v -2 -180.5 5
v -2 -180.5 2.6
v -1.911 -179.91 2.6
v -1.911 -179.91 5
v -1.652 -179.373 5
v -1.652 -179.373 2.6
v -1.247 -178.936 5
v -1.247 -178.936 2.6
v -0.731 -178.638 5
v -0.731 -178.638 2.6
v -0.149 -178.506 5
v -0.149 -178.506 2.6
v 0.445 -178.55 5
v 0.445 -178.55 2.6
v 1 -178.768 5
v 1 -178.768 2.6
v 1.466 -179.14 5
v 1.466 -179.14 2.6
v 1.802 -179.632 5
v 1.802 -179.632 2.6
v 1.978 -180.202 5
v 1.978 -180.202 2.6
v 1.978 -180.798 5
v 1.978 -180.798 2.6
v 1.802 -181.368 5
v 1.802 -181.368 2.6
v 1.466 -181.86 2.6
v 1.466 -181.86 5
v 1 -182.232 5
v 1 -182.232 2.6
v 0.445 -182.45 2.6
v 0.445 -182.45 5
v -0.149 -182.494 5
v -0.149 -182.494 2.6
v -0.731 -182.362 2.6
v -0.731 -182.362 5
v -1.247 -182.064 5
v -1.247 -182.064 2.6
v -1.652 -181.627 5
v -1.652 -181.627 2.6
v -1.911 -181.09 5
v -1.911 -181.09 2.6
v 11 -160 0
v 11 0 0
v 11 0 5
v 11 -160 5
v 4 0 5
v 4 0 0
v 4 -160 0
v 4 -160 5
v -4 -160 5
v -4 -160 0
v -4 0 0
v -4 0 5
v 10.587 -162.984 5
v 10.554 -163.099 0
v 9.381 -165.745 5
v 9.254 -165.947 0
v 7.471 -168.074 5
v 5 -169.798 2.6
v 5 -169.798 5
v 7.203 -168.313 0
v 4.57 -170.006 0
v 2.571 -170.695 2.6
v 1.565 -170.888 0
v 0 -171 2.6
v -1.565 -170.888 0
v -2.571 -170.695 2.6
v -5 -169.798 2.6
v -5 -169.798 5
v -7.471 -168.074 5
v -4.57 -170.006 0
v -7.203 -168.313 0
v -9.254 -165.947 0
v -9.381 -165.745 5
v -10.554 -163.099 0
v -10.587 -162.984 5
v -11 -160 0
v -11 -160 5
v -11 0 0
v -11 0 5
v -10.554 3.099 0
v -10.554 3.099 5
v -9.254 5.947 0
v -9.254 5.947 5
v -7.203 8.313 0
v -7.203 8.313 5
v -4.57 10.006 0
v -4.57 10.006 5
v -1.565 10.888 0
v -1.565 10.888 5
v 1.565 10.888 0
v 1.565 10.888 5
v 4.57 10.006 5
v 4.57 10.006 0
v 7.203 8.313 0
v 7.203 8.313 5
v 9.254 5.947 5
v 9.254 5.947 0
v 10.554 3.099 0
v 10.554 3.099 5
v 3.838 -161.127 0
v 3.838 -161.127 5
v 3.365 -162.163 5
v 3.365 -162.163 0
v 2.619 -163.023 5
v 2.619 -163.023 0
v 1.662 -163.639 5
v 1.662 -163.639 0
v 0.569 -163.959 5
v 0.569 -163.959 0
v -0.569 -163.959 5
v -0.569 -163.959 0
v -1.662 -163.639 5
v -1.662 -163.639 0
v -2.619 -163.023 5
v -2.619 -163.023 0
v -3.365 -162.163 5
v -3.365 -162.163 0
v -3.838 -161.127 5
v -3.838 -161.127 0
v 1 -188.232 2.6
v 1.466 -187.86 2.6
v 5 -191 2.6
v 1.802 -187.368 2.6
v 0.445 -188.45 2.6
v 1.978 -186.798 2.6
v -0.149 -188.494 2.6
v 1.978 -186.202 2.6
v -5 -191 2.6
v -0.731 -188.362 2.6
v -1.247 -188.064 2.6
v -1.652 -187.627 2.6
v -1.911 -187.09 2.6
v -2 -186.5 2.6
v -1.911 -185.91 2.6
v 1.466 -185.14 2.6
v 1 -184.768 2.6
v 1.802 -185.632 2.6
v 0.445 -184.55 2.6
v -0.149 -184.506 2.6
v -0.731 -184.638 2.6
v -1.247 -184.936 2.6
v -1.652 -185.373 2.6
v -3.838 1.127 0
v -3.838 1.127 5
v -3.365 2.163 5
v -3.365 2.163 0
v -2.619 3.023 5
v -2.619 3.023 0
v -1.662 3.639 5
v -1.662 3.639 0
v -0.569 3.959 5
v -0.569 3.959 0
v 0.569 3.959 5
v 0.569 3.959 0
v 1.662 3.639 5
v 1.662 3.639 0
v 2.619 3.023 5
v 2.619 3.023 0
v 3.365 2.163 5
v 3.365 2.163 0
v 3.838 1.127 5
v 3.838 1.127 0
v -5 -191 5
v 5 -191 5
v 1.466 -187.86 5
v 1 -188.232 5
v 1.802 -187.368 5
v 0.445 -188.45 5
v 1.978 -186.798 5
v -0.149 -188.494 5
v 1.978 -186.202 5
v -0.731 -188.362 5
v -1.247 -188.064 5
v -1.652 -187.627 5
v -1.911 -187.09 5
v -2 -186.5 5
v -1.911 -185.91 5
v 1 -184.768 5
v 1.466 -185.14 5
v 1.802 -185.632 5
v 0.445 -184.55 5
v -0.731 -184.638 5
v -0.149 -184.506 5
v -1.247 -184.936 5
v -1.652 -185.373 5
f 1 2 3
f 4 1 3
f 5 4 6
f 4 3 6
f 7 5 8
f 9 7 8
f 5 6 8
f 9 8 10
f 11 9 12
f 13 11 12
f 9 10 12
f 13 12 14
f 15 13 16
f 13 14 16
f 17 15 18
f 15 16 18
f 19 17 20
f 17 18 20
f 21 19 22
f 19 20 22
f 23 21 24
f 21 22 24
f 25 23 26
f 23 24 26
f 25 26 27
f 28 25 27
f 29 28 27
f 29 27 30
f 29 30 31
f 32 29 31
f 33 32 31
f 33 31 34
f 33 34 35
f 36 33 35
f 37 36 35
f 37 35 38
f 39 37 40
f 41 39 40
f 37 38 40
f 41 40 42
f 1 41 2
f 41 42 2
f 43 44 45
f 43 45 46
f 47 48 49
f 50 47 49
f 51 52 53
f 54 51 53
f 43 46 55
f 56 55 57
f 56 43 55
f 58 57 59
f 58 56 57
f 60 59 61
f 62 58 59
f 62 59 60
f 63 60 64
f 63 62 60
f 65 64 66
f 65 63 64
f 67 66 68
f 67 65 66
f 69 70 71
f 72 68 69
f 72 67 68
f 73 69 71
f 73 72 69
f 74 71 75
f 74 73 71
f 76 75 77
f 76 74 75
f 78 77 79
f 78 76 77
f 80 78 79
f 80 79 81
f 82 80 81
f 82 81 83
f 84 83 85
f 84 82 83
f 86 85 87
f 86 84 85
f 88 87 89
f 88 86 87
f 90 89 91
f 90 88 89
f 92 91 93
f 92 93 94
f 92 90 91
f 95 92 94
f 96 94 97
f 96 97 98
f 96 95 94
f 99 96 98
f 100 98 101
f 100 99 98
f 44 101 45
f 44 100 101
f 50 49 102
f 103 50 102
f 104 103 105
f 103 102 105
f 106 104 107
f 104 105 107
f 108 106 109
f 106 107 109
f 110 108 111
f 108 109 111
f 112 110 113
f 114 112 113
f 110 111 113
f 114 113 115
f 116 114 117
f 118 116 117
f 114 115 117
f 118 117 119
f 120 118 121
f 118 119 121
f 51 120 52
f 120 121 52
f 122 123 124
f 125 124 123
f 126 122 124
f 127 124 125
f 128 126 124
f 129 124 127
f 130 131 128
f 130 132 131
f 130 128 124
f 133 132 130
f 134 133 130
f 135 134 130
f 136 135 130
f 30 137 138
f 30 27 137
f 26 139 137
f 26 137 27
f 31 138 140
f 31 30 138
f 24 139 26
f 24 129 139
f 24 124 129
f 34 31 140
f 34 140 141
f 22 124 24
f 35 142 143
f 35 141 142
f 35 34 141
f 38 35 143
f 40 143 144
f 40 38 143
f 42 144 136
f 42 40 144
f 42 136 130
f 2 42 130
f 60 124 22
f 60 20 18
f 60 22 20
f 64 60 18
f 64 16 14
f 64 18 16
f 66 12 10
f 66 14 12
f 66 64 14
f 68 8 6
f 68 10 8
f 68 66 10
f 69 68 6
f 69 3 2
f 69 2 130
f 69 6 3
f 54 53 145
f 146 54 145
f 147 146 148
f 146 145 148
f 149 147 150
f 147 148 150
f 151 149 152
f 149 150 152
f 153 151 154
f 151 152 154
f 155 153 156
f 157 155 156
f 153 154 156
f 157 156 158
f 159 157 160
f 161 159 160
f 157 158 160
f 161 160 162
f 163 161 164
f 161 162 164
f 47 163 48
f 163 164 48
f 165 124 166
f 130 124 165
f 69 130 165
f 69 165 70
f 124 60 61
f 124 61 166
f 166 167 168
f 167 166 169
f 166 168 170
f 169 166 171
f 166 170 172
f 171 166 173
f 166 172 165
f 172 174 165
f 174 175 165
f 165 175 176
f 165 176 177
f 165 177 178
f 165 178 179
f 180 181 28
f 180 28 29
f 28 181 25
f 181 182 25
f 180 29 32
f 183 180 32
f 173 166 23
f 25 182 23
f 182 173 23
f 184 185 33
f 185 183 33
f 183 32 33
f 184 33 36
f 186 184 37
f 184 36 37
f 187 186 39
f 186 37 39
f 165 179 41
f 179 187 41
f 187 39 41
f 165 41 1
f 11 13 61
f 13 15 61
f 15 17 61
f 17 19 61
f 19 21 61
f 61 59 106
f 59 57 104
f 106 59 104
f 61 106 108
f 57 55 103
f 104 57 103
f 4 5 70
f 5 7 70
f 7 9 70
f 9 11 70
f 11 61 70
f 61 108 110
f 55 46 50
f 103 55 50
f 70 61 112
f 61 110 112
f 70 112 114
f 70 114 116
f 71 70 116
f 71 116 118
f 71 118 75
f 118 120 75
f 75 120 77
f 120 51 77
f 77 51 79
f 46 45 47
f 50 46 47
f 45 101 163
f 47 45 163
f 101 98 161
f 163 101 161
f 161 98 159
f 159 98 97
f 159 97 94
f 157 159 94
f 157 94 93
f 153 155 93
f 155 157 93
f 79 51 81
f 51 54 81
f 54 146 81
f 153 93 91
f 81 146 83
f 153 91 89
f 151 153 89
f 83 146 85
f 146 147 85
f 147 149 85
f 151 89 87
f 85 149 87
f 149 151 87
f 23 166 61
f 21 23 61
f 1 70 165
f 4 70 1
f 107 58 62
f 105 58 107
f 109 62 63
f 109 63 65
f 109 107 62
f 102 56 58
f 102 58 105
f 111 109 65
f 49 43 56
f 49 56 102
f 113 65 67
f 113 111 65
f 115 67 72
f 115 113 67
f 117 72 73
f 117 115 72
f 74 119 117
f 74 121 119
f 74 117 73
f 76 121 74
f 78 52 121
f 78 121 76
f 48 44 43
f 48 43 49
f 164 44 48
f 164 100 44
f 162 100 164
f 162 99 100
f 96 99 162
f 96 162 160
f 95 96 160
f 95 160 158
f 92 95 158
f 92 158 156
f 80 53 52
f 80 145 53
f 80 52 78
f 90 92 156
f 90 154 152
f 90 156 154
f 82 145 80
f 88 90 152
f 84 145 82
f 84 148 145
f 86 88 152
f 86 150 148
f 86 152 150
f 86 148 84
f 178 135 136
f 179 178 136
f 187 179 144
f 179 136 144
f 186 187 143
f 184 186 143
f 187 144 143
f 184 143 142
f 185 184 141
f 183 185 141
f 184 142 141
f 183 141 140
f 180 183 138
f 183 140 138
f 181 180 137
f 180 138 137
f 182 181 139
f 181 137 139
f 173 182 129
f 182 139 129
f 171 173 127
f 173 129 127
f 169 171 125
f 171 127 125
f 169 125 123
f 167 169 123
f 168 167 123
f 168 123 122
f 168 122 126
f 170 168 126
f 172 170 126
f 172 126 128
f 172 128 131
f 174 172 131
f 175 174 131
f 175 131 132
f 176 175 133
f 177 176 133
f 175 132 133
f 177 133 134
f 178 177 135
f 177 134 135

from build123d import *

# Parameters (mm, degrees)
BOSS_EXTRUDE1_DEPTH = 5
BOSS_EXTRUDE2_START = -2.4
BOSS_EXTRUDE2_DEPTH = 2.4
SKETCH3_R           = 2
CUT_EXTRUDE1_DEPTH  = 2.4


with BuildPart() as part:
    # Sketch1 → Boss-Extrude1 (new body)
    with BuildSketch(Plane.XY):
        with BuildLine():
            Line((11, 0), (11, -160))
            ThreePointArc((11, -160), (0, -171), (-11, -160))
            Line((-11, -160), (-11, 0))
            ThreePointArc((-11, 0), (0, 11), (11, 0))
        make_face()
        with BuildLine():
            Line((-4, -160), (-4, 0))
            ThreePointArc((-4, 0), (0, 4), (4, 0))
            Line((4, 0), (4, -160))
            ThreePointArc((4, -160), (0, -164), (-4, -160))
        make_face(mode=Mode.SUBTRACT)
    extrude(amount=BOSS_EXTRUDE1_DEPTH)

    # Sketch2 → Boss-Extrude2 (add)
    with BuildSketch(Plane.XY.offset(5).offset(BOSS_EXTRUDE2_START)):
        with BuildLine():
            Line((-5, -171), (-5, -169.797958971))
            ThreePointArc((-5, -169.797958971), (0, -171), (5, -169.797958971))
            Line((5, -169.797958971), (5, -171))
            Line((5, -171), (5, -191))
            Line((5, -191), (-5, -191))
            Line((-5, -191), (-5, -171))
        make_face()
    extrude(amount=BOSS_EXTRUDE2_DEPTH)

    # Sketch3 → Cut-Extrude1 (cut)
    with BuildSketch(Plane(origin=(0, 0, 2.6), x_dir=(-1, 0, 0), z_dir=(0, 0, -1))):
        with Locations((0, -186.5)):
            Circle(SKETCH3_R)
        with Locations((0, -180.5)):
            Circle(SKETCH3_R)
    extrude(amount=-CUT_EXTRUDE1_DEPTH, mode=Mode.SUBTRACT)


solid = part.part
